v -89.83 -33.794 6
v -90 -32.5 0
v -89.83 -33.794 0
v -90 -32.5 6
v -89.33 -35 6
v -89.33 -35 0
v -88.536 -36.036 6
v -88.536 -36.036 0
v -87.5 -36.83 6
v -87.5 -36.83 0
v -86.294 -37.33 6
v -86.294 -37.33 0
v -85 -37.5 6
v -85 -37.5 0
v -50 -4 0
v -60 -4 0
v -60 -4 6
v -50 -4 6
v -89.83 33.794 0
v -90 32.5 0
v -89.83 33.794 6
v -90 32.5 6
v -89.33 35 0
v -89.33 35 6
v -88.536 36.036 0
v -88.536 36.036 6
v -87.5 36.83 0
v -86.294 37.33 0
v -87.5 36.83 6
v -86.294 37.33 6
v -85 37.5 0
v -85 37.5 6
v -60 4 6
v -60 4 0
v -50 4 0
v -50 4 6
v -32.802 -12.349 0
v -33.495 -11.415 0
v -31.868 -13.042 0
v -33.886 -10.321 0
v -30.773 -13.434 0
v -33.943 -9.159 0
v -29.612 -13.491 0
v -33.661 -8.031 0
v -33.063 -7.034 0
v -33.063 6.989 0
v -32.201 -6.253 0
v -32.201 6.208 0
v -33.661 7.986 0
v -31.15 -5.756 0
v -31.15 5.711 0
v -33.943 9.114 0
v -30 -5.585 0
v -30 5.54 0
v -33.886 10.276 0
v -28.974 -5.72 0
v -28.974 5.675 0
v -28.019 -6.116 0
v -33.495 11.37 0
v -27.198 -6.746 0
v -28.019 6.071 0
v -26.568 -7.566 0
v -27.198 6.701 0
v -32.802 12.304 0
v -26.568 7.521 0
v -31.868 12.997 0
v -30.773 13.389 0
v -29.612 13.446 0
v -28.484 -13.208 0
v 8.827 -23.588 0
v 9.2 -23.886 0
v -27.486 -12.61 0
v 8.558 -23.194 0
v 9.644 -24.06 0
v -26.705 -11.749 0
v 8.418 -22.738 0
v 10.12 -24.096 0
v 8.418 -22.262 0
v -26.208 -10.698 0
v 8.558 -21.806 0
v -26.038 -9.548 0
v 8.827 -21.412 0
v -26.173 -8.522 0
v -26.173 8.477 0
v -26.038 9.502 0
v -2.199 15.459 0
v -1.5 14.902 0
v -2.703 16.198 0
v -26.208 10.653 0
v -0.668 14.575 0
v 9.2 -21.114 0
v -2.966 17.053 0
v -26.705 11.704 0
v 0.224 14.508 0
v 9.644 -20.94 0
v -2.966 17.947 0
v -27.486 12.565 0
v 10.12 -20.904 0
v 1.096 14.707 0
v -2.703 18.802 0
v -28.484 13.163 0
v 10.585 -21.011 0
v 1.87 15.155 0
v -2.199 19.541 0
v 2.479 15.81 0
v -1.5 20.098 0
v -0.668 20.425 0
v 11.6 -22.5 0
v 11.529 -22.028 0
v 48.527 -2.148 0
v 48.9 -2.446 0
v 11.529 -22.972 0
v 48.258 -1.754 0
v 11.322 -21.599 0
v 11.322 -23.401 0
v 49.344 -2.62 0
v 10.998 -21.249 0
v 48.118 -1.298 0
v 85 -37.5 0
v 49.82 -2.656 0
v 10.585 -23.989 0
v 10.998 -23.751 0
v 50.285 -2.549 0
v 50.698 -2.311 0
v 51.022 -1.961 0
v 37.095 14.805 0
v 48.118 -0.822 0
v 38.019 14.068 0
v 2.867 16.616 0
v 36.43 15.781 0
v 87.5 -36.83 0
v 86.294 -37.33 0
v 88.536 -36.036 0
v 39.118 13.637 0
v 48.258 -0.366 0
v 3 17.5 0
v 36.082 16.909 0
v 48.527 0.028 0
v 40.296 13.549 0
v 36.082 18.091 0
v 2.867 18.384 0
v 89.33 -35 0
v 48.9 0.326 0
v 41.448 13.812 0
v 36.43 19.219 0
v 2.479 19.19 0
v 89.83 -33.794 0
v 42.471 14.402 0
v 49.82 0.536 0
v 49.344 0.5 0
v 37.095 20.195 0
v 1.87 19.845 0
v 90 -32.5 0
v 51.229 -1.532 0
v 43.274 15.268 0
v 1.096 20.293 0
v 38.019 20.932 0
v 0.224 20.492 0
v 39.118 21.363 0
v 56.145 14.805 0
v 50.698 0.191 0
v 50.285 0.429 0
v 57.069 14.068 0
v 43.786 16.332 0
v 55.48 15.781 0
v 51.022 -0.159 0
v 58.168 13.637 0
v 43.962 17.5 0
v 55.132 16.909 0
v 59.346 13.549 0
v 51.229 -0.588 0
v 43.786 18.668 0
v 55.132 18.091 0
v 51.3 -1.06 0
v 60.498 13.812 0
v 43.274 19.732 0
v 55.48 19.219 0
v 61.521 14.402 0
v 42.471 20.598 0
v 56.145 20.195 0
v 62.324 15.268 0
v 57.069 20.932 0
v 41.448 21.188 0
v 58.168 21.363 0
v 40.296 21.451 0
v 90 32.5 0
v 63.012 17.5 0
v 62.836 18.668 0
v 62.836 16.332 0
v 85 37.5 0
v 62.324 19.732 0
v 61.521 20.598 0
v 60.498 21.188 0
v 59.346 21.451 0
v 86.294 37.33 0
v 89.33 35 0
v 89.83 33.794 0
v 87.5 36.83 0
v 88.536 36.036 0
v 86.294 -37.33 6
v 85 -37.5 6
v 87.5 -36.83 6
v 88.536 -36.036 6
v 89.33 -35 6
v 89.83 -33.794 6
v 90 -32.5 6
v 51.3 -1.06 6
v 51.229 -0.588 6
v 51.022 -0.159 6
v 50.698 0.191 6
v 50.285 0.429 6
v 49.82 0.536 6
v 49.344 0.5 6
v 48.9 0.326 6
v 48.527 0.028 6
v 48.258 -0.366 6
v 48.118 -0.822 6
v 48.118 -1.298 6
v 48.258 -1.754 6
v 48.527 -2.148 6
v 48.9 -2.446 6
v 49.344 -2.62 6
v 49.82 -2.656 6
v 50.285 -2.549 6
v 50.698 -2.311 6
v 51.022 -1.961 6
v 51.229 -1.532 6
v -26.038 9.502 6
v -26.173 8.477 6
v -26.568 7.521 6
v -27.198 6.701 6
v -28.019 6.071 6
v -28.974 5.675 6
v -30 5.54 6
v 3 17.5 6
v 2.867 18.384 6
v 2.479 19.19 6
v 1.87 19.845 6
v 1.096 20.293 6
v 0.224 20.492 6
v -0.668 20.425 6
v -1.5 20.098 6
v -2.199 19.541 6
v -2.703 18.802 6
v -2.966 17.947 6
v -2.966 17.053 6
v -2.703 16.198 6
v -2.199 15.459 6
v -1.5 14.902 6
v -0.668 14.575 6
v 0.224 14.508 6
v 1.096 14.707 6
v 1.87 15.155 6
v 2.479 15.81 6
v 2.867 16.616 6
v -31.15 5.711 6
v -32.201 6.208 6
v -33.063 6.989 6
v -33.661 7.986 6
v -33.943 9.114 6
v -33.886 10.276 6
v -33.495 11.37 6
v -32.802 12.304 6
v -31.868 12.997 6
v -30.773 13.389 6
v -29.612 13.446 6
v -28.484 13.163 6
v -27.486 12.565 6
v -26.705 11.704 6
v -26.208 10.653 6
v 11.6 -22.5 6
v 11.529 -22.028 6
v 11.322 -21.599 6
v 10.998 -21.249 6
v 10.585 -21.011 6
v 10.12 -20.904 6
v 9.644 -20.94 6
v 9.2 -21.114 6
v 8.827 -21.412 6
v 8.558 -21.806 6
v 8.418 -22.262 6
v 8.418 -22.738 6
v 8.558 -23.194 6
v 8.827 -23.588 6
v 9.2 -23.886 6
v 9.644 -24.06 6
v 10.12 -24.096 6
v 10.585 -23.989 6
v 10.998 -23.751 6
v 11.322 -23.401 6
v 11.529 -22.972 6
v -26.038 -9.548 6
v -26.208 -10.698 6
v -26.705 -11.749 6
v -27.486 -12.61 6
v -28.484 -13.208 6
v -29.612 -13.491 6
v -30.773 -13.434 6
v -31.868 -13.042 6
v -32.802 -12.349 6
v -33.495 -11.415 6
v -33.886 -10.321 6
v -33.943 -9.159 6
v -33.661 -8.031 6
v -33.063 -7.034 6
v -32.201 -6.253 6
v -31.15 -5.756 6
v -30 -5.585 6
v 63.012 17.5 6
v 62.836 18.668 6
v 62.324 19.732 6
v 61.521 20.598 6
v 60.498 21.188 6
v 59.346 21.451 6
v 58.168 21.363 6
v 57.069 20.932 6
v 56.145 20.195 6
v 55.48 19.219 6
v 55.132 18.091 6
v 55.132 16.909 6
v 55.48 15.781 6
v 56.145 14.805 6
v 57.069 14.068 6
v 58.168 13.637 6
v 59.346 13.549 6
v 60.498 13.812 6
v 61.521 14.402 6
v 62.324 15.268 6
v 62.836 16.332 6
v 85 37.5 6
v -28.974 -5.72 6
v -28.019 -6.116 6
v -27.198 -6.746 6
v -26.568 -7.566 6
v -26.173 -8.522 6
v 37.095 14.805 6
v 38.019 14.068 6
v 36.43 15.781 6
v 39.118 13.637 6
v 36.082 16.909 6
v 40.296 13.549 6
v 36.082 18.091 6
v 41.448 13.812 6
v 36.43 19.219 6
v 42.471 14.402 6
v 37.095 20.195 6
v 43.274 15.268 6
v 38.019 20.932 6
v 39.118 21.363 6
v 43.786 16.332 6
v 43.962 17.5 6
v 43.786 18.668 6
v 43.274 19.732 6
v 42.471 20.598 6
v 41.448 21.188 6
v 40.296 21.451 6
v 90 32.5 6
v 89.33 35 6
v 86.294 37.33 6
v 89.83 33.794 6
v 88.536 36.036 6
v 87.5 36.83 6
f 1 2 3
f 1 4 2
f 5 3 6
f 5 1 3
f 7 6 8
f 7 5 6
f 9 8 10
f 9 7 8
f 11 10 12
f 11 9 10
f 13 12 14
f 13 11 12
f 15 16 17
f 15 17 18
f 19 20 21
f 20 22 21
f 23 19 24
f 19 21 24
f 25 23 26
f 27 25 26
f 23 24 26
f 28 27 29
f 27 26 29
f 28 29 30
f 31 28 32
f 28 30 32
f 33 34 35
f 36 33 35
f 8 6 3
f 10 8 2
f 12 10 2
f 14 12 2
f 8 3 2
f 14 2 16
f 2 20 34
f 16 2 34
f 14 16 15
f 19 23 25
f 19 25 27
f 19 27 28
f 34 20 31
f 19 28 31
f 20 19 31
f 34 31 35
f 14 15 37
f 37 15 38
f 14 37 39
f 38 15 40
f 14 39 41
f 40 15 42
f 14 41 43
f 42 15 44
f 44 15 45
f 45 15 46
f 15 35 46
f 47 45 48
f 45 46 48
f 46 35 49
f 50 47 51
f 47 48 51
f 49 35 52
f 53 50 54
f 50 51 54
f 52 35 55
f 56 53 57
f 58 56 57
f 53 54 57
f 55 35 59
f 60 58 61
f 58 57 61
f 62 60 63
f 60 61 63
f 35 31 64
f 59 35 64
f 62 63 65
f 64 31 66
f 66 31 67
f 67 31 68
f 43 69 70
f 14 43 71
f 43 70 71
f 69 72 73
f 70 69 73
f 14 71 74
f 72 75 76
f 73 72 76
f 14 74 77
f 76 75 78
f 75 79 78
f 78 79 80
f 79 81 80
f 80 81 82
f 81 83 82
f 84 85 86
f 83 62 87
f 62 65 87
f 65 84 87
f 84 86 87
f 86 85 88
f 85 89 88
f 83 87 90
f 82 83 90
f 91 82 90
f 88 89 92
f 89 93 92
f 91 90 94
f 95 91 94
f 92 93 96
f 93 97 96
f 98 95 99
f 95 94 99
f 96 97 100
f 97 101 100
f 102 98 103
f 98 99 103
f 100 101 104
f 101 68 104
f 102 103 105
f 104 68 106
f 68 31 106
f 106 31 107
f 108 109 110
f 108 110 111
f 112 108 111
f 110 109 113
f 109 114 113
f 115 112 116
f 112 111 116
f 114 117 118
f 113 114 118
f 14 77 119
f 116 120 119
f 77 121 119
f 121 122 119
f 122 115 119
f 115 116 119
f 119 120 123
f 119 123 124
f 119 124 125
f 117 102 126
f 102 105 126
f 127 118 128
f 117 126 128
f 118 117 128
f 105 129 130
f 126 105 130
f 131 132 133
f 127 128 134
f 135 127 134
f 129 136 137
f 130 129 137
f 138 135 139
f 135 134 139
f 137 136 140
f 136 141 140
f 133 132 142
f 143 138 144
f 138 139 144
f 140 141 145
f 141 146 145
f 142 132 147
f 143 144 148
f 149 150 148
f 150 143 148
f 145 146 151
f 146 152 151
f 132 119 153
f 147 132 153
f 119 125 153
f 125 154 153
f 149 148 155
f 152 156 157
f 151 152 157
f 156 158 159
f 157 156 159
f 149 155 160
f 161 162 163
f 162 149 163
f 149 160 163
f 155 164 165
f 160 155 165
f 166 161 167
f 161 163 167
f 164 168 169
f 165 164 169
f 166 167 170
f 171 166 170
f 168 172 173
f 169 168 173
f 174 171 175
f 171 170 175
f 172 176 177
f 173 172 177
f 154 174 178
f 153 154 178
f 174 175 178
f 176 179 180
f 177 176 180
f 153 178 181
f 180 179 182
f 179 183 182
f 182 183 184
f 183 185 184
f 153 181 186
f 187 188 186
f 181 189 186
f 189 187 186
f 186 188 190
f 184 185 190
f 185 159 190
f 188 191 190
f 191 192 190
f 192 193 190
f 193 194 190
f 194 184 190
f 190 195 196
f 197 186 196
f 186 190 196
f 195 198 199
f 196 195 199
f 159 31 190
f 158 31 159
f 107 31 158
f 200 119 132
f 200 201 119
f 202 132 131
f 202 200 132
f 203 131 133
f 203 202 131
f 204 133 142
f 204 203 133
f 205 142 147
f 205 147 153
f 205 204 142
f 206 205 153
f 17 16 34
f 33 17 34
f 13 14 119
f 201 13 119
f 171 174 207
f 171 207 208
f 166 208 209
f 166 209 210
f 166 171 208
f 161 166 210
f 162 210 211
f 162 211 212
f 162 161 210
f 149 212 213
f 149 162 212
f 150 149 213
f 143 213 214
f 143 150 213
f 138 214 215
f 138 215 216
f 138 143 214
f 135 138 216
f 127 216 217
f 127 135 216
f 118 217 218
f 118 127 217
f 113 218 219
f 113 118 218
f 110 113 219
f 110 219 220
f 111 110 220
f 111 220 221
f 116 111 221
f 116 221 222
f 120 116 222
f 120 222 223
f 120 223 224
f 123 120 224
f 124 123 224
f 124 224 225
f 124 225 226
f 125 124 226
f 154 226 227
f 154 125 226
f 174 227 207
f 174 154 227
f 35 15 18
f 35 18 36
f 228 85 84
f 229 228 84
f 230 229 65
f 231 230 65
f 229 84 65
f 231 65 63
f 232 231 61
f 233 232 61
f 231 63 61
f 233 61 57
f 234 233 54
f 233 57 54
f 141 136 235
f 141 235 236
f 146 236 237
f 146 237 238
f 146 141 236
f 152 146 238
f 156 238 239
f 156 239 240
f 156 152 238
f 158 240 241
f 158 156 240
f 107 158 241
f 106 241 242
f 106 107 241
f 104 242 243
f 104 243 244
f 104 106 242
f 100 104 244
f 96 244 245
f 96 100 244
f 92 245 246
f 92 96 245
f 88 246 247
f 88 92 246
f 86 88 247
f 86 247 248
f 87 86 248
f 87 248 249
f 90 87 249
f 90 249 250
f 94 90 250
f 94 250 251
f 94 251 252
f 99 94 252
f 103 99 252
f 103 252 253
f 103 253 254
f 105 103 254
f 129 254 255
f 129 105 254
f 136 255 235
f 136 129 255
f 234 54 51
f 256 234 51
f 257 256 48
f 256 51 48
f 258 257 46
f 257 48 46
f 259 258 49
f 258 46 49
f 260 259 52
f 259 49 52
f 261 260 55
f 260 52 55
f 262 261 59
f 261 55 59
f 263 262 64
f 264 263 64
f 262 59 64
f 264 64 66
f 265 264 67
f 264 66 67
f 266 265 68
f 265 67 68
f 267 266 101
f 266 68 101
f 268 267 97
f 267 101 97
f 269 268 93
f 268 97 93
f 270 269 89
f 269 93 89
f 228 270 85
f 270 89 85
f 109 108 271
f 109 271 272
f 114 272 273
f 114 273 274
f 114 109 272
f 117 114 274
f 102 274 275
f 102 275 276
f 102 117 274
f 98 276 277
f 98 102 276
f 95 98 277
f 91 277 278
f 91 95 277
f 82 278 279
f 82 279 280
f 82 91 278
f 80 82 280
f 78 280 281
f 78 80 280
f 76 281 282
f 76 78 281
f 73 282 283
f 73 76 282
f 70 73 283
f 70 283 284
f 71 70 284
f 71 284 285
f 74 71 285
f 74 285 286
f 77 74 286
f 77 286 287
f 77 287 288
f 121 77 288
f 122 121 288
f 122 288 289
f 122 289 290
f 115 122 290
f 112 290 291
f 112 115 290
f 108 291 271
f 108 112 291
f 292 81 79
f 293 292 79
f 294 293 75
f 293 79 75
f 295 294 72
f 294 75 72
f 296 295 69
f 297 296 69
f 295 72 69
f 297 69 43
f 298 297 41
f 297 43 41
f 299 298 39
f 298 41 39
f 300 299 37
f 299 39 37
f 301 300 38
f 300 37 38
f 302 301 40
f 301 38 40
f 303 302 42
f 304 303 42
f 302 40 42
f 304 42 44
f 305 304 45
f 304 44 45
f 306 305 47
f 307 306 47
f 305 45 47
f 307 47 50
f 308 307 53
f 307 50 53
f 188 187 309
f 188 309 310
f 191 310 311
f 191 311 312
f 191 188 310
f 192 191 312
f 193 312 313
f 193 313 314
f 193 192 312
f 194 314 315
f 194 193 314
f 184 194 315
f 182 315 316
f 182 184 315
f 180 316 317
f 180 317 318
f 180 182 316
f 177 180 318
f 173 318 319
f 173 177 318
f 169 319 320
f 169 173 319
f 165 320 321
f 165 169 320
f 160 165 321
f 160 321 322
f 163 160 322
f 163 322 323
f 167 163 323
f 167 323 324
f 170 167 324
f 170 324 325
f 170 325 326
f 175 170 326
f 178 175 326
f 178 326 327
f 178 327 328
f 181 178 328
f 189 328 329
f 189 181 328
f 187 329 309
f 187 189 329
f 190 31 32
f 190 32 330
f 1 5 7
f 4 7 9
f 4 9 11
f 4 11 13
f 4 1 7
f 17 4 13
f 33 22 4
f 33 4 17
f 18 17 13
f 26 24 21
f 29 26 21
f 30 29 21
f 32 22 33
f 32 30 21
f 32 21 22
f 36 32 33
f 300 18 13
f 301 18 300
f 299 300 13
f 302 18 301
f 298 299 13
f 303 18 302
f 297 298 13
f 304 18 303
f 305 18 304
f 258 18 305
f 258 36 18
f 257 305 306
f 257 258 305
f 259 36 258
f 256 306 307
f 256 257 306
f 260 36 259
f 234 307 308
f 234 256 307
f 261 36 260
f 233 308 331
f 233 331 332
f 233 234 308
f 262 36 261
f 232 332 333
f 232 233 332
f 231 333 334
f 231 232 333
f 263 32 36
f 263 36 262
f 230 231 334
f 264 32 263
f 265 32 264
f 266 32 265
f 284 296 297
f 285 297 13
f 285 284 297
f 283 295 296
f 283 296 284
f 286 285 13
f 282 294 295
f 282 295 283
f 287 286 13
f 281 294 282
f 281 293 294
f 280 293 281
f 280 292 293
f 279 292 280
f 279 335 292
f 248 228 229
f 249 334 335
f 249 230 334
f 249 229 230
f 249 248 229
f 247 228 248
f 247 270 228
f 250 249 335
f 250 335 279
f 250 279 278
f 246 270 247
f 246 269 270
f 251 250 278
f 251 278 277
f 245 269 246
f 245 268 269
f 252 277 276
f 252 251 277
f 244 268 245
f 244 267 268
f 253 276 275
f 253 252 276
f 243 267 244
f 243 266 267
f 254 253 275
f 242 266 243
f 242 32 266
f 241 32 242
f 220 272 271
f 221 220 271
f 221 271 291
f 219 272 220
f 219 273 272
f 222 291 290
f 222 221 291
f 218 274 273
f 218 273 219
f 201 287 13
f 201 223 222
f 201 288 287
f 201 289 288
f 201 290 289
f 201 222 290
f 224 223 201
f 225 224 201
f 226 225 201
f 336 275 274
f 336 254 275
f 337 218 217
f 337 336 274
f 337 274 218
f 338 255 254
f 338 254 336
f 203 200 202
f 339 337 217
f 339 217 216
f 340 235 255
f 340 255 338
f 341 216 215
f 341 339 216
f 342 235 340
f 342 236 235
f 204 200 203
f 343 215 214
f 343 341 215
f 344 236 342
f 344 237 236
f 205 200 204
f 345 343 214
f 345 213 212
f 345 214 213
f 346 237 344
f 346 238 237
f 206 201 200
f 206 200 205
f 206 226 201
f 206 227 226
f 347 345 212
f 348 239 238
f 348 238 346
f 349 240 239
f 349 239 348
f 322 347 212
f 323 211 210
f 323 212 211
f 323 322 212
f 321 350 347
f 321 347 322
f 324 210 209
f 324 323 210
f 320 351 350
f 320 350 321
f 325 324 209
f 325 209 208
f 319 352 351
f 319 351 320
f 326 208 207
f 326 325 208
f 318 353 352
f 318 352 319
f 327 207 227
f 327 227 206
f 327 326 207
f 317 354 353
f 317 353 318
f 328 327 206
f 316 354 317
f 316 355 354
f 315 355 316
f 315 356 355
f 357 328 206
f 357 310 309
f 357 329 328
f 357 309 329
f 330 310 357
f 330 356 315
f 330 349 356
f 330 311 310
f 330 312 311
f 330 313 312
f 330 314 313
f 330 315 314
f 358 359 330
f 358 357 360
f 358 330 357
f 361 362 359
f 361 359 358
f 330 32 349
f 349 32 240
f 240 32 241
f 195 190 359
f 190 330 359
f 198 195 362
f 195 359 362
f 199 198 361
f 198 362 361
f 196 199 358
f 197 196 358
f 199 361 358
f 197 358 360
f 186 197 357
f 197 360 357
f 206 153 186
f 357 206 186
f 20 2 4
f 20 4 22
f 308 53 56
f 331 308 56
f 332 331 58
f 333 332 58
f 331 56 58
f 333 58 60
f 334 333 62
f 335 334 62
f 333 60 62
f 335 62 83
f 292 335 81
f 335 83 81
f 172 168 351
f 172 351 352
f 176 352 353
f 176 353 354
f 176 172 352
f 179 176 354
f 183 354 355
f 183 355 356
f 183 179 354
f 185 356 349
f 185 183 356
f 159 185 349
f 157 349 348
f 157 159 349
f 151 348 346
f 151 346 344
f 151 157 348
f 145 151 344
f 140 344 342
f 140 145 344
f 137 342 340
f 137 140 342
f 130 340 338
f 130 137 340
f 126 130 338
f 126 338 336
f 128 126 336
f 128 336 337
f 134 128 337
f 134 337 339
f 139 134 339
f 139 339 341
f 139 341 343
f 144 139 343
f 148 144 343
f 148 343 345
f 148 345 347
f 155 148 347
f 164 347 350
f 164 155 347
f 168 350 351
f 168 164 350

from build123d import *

# Parameters (mm, degrees)
F0_W     = 180
F0_H     = 75
F0_R     = 1.6
F0_W_2   = 10
F0_H_2   = 8
F0_R_2   = 3
F0_R_3   = 3.9624
F1_DEPTH = 6
F2_R     = 5


with BuildPart() as f1:
    # F0 (on Top) → F1 (new body)
    with BuildSketch(Plane.XY):
        Rectangle(F0_W, F0_H)
        with BuildLine():
            ThreePointArc((-26.0376, -9.5475), (-32.80184, -12.34934), (-30, -5.5851))
            ThreePointArc((-30, -5.5851), (-27.19816, -6.74566), (-26.0376, -9.5475))
        make_face(mode=Mode.SUBTRACT)
        with Locations((10, -22.5)):
            Circle(F0_R, mode=Mode.SUBTRACT)
        with Locations((49.7, -1.06)):
            Circle(F0_R, mode=Mode.SUBTRACT)
        with Locations((-55, 0)):
            Rectangle(F0_W_2, F0_H_2, mode=Mode.SUBTRACT)
        with BuildLine():
            ThreePointArc((-30, 5.5401), (-32.80184, 12.30434), (-26.0376, 9.5025))
            ThreePointArc((-26.0376, 9.5025), (-27.19816, 6.70066), (-30, 5.5401))
        make_face(mode=Mode.SUBTRACT)
        with Locations((0, 17.5)):
            Circle(F0_R_2, mode=Mode.SUBTRACT)
        with Locations((40, 17.5)):
            Circle(F0_R_3, mode=Mode.SUBTRACT)
        with Locations((59.05, 17.5)):
            Circle(F0_R_3, mode=Mode.SUBTRACT)
    extrude(amount=F1_DEPTH)

    # F2
    f2_edges = [f1.edges().sort_by_distance(p)[0] for p in [
        (-90, 37.5, 3),
        (90, 37.5, 3),
        (90, -37.5, 3),
        (-90, -37.5, 3),
    ]]
    fillet(f2_edges, radius=F2_R)


solid = f1.part
